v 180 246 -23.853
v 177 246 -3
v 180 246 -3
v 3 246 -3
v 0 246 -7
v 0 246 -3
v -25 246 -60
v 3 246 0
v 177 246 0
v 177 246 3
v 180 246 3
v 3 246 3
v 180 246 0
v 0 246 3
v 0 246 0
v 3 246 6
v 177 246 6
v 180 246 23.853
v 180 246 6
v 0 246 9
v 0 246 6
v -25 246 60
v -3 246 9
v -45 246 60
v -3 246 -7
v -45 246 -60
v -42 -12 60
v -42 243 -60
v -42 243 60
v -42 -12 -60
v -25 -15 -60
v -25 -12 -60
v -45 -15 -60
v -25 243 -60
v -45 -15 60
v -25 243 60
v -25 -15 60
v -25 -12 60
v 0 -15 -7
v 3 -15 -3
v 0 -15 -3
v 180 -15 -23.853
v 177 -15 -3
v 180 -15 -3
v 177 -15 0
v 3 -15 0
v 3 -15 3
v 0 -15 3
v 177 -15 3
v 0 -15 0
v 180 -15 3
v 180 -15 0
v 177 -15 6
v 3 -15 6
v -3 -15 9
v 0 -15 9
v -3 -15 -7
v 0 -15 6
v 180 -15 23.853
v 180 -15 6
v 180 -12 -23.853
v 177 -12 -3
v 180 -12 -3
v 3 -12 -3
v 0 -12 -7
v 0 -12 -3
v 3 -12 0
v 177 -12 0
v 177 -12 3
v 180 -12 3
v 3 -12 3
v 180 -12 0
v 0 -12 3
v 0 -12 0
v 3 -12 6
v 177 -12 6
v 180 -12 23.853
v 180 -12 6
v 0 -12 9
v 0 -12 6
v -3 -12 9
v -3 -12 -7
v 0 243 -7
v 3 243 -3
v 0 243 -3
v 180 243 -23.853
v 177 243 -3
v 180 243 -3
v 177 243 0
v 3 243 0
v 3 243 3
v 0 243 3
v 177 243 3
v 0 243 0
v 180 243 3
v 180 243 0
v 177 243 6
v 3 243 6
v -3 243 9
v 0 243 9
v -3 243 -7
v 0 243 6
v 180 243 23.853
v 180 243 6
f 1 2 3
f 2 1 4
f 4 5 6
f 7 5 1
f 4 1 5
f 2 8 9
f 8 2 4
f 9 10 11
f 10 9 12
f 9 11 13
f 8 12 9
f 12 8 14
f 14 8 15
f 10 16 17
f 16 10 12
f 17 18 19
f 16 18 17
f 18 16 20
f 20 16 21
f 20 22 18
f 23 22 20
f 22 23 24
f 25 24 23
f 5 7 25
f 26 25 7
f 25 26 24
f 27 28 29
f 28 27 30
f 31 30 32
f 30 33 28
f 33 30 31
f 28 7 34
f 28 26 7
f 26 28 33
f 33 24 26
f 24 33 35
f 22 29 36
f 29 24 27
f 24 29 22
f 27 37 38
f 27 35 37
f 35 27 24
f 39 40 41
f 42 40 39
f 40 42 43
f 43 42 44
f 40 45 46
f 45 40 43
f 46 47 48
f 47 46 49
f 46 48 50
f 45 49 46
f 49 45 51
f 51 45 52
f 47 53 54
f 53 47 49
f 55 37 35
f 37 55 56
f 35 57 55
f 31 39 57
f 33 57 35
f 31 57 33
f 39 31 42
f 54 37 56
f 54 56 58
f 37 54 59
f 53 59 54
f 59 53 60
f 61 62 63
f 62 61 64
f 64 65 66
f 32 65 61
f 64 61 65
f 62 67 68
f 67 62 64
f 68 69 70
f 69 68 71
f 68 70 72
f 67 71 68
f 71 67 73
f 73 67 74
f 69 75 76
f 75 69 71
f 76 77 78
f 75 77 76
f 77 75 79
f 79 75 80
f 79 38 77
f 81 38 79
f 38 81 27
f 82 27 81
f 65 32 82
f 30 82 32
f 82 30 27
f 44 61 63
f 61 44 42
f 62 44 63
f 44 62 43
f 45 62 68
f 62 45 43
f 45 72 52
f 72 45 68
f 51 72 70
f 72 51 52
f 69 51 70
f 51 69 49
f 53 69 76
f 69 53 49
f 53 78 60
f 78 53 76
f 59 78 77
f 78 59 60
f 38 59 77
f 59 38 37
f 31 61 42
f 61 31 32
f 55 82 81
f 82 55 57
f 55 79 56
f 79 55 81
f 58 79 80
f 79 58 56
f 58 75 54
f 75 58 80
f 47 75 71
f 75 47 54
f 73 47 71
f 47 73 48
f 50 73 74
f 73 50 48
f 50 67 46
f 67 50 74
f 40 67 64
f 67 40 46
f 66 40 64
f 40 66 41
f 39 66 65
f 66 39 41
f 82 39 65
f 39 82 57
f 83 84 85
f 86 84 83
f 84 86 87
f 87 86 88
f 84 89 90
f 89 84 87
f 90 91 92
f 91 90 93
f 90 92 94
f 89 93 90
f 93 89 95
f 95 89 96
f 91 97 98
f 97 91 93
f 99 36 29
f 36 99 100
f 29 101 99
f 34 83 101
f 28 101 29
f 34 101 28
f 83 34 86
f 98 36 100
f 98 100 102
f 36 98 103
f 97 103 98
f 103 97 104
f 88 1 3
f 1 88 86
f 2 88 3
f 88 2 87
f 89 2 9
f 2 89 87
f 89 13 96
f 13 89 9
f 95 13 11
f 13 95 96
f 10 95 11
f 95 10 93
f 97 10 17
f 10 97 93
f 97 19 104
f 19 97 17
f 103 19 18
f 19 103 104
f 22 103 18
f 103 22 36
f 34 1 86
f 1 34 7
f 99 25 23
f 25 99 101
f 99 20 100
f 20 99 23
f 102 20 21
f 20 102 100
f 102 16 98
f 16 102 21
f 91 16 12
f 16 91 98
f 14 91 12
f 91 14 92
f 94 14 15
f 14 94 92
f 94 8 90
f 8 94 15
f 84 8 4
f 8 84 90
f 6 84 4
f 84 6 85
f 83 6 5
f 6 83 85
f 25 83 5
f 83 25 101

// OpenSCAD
//TODO check all joints

mdfwidth = 3;
diameter = 30;
columns = 7;
rows = 6;
querspiel = 15;
hochspiel = 0;
discspiel = .5;
zwischenspiel = 3.5;
plattenhoehe = rows*diameter;
plattenbreite = columns*diameter+(columns-1)*zwischenspiel+2*querspiel;
wannenbreite = 120;
fallhoehe = 1.5*diameter;
stopperbreite = 16;
stopperspiel = 8;
stopperlaenge = plattenbreite + 2 * stopperspiel;
randhoehe = 20;

module disc(){
    linear_extrude(mdfwidth) 
        circle(d=diameter);
}

module disc1(){ 
    color("red")
        linear_extrude(mdfwidth)  
            difference(){
                circle(d=diameter);
                circle(d=diameter/2,$fn=5);
            }
}


module disc2(){
    color("yellow")
        linear_extrude(mdfwidth) 
            difference(){
                circle(d=diameter);
                circle(d=diameter/2,$fn=3);
            }
}

module minicircle(){ 
        circle(d=diameter/1.5);
}
  

module blade(){
    linear_extrude(mdfwidth)
        translate([0,-querspiel,0]){
        difference(){
            square([plattenhoehe,plattenbreite]);  
            translate([mdfwidth,0,0])
                square([plattenhoehe-2*mdfwidth,mdfwidth]);
            translate([mdfwidth,plattenbreite-mdfwidth,0]) 
                    square([plattenhoehe-2*mdfwidth,mdfwidth]);
            for (i=[0:rows-1]){
                for (j=[0:columns-1]){ 
                    translate([(i+.5)*diameter,(j+.5)*diameter+j*zwischenspiel,0])   
                    translate([0,querspiel,0])
                        minicircle();   
                }
            }
            for (j=[0:columns]){ 
                translate([0,(j+.5)*diameter+(j-1)*zwischenspiel,0]) 
                    square([mdfwidth,mdfwidth]);
            }
        }
    }
}
    
 
module discset(){
    for (i=[0:rows-1]){
        for (j=[0:columns-1]){ 
            single_rand = rands(0,10,1)[0]; 
            translate([(i+.5)*diameter,(j+.5)*diameter+j*zwischenspiel,0])            
            if (single_rand > 5){
                    disc1();
            }
            else{
                    disc2();
            }
        }
    }
}


module abstandhalterset(){ 
        for (j=[0:columns]){  
            translate([0,(j)*diameter+j*zwischenspiel-zwischenspiel,0])            
                abstandhalter();
        }
}

module abstandhalter(){
    rotate([0,90,90])
    linear_extrude(mdfwidth)
        translate([-mdfwidth/2,-.5*plattenhoehe,0])
            difference(){
            square([mdfwidth*3+2*discspiel,plattenhoehe],center=true);
            translate([mdfwidth+discspiel,0,0])
                square([mdfwidth*1.2,plattenhoehe-2*mdfwidth],center=true);   
            translate([-mdfwidth-discspiel,0,0])
                square([mdfwidth*1.2,plattenhoehe-2*mdfwidth],center=true);                
            }
}

module wanne(){
    color("blue")
    translate([-fallhoehe+mdfwidth,0,(mdfwidth/2-discspiel/2)-wannenbreite/2])
    rotate([0,-90,0])
//    linear_extrude(mdfwidth)
    translate([0,-querspiel,0])
        linear_extrude(mdfwidth)
            square([wannenbreite,plattenbreite]);
}


module wannenbegrenzung(){
    translate([-fallhoehe,-querspiel,0])
    square([randhoehe,plattenbreite]);
}

module stopper(){ 
    color("blue")
    translate([0,-stopperspiel,(mdfwidth/2-discspiel/2)-stopperbreite/2])
    rotate([0,-90,0]) 
    translate([0,-querspiel,0])
    linear_extrude(mdfwidth)
        square([stopperbreite,stopperlaenge]);
}

module staender(){
    translate([-fallhoehe,0,-wannenbreite/2])
        rotate([90,0,0])
            linear_extrude(mdfwidth)
                difference(){
                square([fallhoehe+plattenhoehe,wannenbreite]);  
//                    Löcher
                translate([fallhoehe,wannenbreite/2-mdfwidth,0])                  
                    square([mdfwidth,mdfwidth]);
                translate([fallhoehe,wannenbreite/2+mdfwidth,0])                  
                    square([mdfwidth,mdfwidth]);
                translate([fallhoehe+plattenhoehe-mdfwidth,wannenbreite/2-mdfwidth,0])                  
                    square([mdfwidth,mdfwidth]);
                translate([fallhoehe+plattenhoehe-mdfwidth,wannenbreite/2+mdfwidth,0])                  
                    square([mdfwidth,mdfwidth]);
//                    stopperschlitz
                translate([fallhoehe-mdfwidth,wannenbreite/2-stopperbreite/2+discspiel*2,0])                
                    square([mdfwidth,stopperbreite]);
                    
                translate([randhoehe,0,0])
                    rotate([180,0,10])
                        square([1.3*fallhoehe+plattenhoehe,wannenbreite]);
                translate([randhoehe,wannenbreite,0])
                    mirror([0,10,0])
                        rotate([180,0,10])
                            square([1.3*fallhoehe+plattenhoehe,wannenbreite]); 
                }
    }

//discset();
//abstandhalterset();
translate([0,,0,-mdfwidth/2+.5*discspiel])
wanne();
//    
//translate([0,,0,wannenbreite/2])
//wannenbegrenzung();
//translate([0,,0,-wannenbreite/2])
//wannenbegrenzung();
//    
//stopper();
//     
translate([0,-querspiel+mdfwidth,0])
    staender(); 
    
translate([0,plattenbreite-querspiel,0])
    staender();    

//translate([0,0,mdfwidth+discspiel])
//    color("brown",.7)
//    blade();
//translate([0,0,-(mdfwidth+discspiel)])
//    color("brown",.7)
//    blade();
